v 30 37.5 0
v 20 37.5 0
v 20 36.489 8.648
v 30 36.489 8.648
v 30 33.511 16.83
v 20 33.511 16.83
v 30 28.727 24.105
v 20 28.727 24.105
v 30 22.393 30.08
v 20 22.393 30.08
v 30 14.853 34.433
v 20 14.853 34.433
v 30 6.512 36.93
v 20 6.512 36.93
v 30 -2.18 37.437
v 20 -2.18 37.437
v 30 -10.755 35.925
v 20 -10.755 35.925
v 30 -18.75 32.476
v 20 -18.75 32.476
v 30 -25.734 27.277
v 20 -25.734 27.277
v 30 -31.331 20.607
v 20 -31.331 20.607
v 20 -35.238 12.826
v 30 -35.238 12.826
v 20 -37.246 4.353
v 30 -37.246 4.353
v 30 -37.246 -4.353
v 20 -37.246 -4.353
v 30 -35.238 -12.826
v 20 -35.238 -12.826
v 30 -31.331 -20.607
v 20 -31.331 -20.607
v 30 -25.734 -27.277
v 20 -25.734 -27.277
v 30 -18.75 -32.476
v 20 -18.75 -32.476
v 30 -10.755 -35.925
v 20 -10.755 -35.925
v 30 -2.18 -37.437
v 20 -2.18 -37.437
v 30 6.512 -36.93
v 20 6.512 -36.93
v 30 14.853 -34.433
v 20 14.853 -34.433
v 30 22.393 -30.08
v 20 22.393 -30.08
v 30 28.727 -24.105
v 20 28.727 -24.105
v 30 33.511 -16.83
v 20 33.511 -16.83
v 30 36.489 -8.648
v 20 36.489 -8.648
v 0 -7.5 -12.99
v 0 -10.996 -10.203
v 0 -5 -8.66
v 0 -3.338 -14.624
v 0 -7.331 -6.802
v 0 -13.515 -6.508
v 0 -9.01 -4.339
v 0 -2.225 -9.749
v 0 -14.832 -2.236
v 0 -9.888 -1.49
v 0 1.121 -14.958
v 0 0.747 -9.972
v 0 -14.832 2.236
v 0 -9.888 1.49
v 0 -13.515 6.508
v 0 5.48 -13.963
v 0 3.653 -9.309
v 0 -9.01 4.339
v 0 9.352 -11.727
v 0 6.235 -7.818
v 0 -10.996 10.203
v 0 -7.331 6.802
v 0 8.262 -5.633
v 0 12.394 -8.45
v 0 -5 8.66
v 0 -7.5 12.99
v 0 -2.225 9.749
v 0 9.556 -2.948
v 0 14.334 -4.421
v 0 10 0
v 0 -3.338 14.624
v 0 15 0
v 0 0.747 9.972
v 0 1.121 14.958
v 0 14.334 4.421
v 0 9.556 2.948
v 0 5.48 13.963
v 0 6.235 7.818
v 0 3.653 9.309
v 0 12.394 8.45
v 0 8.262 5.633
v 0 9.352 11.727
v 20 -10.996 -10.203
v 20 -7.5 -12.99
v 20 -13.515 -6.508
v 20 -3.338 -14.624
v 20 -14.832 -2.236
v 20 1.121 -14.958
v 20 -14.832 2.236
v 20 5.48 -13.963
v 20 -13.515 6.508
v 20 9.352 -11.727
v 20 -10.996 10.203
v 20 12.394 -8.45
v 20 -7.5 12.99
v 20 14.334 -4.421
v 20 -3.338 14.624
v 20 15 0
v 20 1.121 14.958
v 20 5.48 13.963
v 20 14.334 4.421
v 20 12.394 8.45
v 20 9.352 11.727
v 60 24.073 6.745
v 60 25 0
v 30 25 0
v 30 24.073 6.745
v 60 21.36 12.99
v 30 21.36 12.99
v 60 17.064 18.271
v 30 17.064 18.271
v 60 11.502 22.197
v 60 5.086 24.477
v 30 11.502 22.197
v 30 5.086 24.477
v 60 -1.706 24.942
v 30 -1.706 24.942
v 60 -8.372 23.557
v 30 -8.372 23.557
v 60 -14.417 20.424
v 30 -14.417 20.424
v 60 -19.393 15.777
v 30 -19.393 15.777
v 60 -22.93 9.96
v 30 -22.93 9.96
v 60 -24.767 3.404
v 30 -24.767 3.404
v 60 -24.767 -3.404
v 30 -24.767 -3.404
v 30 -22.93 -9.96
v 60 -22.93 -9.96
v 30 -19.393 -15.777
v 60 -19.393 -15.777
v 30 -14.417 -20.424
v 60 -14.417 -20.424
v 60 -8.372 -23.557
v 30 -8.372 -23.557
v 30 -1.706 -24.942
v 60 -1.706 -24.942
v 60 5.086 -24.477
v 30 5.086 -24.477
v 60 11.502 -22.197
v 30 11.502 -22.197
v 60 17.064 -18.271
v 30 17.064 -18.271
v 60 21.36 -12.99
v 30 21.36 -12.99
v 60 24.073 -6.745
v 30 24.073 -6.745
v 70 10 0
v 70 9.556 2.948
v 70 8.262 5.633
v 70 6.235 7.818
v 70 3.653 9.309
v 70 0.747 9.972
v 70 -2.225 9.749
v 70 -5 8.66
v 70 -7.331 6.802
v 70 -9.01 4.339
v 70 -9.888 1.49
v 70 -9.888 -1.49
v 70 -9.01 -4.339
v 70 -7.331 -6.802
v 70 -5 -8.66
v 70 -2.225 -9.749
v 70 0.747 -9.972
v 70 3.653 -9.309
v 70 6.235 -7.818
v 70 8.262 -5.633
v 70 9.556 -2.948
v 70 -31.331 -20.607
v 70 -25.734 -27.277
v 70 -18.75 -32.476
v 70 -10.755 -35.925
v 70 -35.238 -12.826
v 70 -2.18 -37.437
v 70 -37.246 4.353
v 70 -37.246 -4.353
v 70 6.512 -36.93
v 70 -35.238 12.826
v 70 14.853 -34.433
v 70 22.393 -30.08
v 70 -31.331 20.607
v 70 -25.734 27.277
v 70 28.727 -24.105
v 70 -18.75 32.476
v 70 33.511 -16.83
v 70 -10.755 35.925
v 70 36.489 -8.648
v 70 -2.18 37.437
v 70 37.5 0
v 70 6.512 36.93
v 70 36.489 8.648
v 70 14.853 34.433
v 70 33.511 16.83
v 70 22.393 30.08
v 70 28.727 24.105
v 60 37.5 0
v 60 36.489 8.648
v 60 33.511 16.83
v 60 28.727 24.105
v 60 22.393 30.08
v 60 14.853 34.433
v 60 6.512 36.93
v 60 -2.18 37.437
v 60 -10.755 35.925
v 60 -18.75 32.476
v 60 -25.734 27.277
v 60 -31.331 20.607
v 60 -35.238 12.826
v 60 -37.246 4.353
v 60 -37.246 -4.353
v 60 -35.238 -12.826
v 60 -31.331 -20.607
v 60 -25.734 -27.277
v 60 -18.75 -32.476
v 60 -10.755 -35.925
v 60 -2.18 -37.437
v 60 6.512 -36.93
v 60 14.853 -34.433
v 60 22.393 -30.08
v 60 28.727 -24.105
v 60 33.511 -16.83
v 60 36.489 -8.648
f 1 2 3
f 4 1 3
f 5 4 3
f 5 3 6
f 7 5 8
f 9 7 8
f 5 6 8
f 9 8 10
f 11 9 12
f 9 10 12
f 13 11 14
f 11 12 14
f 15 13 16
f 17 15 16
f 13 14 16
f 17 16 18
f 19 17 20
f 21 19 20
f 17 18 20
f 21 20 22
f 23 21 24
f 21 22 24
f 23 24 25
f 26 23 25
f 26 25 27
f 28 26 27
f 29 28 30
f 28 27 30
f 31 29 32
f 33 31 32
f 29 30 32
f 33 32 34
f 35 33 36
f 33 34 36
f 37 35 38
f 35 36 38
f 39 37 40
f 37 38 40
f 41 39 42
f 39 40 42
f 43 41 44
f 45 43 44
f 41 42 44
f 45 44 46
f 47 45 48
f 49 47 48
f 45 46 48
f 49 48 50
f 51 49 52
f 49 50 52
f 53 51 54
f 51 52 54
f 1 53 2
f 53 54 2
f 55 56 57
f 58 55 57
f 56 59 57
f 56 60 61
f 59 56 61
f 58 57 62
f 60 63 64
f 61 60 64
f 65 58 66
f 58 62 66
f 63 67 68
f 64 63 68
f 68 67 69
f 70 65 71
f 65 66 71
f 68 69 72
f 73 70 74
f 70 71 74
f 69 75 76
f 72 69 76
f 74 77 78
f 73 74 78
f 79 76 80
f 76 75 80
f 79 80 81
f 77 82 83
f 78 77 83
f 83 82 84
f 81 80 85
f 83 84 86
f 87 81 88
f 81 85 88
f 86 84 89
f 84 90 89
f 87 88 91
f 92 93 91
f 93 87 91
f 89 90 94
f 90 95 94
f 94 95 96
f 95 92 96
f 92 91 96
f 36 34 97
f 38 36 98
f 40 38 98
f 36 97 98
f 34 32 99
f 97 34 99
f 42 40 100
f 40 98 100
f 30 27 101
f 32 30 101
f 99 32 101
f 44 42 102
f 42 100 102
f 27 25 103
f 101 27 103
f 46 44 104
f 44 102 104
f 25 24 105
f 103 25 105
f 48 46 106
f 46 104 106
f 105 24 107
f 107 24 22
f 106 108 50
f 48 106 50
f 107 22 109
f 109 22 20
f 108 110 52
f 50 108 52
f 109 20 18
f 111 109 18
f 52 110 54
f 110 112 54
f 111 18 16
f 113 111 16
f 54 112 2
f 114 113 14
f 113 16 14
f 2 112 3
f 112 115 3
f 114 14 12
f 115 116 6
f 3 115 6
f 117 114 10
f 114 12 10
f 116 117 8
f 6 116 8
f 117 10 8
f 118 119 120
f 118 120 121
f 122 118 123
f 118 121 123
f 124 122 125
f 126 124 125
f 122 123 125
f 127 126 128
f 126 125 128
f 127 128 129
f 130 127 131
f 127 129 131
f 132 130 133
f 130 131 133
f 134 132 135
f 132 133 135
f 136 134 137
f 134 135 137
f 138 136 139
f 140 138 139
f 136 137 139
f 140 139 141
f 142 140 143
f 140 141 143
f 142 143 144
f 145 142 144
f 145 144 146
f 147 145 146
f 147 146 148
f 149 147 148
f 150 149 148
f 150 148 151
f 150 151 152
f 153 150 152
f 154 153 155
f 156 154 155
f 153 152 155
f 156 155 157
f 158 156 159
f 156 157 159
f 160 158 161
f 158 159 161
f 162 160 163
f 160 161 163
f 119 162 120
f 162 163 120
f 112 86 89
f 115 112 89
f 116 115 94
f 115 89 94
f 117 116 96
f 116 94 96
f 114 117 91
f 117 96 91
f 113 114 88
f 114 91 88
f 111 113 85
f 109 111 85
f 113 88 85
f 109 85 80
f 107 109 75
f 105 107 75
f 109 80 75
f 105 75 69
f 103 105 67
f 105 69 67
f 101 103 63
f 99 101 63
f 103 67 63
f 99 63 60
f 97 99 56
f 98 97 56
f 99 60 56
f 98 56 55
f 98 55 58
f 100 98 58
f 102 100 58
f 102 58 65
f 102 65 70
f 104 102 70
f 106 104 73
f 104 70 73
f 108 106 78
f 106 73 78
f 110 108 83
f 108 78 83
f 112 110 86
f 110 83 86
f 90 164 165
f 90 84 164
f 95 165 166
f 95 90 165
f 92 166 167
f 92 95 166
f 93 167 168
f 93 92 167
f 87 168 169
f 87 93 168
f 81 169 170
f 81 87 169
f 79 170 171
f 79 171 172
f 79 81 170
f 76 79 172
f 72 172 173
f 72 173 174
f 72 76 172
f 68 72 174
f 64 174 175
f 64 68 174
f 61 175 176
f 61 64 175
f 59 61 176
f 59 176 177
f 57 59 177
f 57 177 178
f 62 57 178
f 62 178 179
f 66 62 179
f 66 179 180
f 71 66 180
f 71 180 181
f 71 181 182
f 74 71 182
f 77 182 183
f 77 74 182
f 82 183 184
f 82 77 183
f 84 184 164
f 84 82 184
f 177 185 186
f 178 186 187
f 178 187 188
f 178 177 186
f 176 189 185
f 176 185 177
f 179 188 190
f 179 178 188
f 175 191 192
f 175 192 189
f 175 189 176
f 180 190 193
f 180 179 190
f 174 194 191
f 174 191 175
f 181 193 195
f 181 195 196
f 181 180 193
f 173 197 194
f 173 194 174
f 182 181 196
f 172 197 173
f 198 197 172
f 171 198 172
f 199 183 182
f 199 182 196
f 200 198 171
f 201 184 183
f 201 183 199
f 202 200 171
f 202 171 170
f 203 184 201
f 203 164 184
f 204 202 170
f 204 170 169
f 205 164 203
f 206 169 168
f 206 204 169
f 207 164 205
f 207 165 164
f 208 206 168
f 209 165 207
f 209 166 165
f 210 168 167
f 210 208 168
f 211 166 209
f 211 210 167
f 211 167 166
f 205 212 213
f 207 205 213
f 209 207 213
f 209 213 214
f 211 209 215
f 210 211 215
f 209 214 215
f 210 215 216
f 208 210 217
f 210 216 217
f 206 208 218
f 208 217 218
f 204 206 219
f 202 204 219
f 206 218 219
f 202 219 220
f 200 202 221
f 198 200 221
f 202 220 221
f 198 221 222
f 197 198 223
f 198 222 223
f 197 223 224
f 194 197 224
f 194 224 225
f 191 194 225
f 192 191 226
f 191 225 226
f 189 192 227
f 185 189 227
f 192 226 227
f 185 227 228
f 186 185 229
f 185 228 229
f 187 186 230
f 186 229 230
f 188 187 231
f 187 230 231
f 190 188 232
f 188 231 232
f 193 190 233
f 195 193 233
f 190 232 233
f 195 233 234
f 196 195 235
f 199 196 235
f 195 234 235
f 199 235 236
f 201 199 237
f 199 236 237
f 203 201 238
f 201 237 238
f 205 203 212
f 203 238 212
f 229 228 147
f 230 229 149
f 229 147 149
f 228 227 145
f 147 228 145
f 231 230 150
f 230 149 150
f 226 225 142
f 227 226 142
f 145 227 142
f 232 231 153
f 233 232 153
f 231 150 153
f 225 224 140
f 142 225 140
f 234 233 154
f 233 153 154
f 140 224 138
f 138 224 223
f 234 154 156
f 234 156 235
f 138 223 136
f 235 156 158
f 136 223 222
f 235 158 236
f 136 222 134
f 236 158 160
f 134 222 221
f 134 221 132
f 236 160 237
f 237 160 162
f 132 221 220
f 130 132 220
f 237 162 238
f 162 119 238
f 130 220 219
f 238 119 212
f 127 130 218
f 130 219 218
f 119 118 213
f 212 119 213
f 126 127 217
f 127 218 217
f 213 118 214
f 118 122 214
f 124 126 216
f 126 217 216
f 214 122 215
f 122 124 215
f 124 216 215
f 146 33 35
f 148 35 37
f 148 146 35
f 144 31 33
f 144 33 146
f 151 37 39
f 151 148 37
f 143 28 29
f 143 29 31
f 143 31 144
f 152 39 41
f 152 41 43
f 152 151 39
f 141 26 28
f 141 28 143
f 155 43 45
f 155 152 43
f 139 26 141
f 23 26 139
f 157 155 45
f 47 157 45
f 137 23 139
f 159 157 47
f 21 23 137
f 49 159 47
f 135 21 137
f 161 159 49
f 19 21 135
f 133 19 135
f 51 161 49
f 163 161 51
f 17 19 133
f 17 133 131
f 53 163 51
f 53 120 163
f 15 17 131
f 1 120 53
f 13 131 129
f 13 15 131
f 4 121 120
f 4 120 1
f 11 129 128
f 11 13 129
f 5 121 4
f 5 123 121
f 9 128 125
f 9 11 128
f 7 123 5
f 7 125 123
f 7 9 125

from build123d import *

# Parameters (mm, degrees)
F0_R     = 15
F0_R_2   = 10
F1_DEPTH = 20
F2_R     = 37.5
F2_R_2   = 15
F2_R_3   = 10
F3_DEPTH = 10
F4_R     = 25
F4_R_2   = 10
F5_DEPTH = 30
F6_R     = 37.5
F6_R_2   = 25
F6_R_3   = 10
F7_DEPTH = 10


with BuildPart() as f1:
    # F0 (on Right) → F1 (new body)
    with BuildSketch(Plane.YZ):
        Circle(F0_R)
        Circle(F0_R_2, mode=Mode.SUBTRACT)
    extrude(amount=F1_DEPTH)

    # F2 (on face) → F3 (join)
    with BuildSketch(Plane.YZ.offset(20)):
        Circle(F2_R)
        Circle(F2_R_2, mode=Mode.SUBTRACT)
        Circle(F2_R_2)
        Circle(F2_R_3, mode=Mode.SUBTRACT)
    extrude(amount=F3_DEPTH)

    # F4 (on face) → F5 (join)
    with BuildSketch(Plane.YZ.offset(30)):
        Circle(F4_R)
        Circle(F4_R_2, mode=Mode.SUBTRACT)
    extrude(amount=F5_DEPTH)

    # F6 (on face) → F7 (join)
    with BuildSketch(Plane.YZ.offset(60)):
        Circle(F6_R)
        Circle(F6_R_2, mode=Mode.SUBTRACT)
        Circle(F6_R_2)
        Circle(F6_R_3, mode=Mode.SUBTRACT)
    extrude(amount=F7_DEPTH)


solid = f1.part
